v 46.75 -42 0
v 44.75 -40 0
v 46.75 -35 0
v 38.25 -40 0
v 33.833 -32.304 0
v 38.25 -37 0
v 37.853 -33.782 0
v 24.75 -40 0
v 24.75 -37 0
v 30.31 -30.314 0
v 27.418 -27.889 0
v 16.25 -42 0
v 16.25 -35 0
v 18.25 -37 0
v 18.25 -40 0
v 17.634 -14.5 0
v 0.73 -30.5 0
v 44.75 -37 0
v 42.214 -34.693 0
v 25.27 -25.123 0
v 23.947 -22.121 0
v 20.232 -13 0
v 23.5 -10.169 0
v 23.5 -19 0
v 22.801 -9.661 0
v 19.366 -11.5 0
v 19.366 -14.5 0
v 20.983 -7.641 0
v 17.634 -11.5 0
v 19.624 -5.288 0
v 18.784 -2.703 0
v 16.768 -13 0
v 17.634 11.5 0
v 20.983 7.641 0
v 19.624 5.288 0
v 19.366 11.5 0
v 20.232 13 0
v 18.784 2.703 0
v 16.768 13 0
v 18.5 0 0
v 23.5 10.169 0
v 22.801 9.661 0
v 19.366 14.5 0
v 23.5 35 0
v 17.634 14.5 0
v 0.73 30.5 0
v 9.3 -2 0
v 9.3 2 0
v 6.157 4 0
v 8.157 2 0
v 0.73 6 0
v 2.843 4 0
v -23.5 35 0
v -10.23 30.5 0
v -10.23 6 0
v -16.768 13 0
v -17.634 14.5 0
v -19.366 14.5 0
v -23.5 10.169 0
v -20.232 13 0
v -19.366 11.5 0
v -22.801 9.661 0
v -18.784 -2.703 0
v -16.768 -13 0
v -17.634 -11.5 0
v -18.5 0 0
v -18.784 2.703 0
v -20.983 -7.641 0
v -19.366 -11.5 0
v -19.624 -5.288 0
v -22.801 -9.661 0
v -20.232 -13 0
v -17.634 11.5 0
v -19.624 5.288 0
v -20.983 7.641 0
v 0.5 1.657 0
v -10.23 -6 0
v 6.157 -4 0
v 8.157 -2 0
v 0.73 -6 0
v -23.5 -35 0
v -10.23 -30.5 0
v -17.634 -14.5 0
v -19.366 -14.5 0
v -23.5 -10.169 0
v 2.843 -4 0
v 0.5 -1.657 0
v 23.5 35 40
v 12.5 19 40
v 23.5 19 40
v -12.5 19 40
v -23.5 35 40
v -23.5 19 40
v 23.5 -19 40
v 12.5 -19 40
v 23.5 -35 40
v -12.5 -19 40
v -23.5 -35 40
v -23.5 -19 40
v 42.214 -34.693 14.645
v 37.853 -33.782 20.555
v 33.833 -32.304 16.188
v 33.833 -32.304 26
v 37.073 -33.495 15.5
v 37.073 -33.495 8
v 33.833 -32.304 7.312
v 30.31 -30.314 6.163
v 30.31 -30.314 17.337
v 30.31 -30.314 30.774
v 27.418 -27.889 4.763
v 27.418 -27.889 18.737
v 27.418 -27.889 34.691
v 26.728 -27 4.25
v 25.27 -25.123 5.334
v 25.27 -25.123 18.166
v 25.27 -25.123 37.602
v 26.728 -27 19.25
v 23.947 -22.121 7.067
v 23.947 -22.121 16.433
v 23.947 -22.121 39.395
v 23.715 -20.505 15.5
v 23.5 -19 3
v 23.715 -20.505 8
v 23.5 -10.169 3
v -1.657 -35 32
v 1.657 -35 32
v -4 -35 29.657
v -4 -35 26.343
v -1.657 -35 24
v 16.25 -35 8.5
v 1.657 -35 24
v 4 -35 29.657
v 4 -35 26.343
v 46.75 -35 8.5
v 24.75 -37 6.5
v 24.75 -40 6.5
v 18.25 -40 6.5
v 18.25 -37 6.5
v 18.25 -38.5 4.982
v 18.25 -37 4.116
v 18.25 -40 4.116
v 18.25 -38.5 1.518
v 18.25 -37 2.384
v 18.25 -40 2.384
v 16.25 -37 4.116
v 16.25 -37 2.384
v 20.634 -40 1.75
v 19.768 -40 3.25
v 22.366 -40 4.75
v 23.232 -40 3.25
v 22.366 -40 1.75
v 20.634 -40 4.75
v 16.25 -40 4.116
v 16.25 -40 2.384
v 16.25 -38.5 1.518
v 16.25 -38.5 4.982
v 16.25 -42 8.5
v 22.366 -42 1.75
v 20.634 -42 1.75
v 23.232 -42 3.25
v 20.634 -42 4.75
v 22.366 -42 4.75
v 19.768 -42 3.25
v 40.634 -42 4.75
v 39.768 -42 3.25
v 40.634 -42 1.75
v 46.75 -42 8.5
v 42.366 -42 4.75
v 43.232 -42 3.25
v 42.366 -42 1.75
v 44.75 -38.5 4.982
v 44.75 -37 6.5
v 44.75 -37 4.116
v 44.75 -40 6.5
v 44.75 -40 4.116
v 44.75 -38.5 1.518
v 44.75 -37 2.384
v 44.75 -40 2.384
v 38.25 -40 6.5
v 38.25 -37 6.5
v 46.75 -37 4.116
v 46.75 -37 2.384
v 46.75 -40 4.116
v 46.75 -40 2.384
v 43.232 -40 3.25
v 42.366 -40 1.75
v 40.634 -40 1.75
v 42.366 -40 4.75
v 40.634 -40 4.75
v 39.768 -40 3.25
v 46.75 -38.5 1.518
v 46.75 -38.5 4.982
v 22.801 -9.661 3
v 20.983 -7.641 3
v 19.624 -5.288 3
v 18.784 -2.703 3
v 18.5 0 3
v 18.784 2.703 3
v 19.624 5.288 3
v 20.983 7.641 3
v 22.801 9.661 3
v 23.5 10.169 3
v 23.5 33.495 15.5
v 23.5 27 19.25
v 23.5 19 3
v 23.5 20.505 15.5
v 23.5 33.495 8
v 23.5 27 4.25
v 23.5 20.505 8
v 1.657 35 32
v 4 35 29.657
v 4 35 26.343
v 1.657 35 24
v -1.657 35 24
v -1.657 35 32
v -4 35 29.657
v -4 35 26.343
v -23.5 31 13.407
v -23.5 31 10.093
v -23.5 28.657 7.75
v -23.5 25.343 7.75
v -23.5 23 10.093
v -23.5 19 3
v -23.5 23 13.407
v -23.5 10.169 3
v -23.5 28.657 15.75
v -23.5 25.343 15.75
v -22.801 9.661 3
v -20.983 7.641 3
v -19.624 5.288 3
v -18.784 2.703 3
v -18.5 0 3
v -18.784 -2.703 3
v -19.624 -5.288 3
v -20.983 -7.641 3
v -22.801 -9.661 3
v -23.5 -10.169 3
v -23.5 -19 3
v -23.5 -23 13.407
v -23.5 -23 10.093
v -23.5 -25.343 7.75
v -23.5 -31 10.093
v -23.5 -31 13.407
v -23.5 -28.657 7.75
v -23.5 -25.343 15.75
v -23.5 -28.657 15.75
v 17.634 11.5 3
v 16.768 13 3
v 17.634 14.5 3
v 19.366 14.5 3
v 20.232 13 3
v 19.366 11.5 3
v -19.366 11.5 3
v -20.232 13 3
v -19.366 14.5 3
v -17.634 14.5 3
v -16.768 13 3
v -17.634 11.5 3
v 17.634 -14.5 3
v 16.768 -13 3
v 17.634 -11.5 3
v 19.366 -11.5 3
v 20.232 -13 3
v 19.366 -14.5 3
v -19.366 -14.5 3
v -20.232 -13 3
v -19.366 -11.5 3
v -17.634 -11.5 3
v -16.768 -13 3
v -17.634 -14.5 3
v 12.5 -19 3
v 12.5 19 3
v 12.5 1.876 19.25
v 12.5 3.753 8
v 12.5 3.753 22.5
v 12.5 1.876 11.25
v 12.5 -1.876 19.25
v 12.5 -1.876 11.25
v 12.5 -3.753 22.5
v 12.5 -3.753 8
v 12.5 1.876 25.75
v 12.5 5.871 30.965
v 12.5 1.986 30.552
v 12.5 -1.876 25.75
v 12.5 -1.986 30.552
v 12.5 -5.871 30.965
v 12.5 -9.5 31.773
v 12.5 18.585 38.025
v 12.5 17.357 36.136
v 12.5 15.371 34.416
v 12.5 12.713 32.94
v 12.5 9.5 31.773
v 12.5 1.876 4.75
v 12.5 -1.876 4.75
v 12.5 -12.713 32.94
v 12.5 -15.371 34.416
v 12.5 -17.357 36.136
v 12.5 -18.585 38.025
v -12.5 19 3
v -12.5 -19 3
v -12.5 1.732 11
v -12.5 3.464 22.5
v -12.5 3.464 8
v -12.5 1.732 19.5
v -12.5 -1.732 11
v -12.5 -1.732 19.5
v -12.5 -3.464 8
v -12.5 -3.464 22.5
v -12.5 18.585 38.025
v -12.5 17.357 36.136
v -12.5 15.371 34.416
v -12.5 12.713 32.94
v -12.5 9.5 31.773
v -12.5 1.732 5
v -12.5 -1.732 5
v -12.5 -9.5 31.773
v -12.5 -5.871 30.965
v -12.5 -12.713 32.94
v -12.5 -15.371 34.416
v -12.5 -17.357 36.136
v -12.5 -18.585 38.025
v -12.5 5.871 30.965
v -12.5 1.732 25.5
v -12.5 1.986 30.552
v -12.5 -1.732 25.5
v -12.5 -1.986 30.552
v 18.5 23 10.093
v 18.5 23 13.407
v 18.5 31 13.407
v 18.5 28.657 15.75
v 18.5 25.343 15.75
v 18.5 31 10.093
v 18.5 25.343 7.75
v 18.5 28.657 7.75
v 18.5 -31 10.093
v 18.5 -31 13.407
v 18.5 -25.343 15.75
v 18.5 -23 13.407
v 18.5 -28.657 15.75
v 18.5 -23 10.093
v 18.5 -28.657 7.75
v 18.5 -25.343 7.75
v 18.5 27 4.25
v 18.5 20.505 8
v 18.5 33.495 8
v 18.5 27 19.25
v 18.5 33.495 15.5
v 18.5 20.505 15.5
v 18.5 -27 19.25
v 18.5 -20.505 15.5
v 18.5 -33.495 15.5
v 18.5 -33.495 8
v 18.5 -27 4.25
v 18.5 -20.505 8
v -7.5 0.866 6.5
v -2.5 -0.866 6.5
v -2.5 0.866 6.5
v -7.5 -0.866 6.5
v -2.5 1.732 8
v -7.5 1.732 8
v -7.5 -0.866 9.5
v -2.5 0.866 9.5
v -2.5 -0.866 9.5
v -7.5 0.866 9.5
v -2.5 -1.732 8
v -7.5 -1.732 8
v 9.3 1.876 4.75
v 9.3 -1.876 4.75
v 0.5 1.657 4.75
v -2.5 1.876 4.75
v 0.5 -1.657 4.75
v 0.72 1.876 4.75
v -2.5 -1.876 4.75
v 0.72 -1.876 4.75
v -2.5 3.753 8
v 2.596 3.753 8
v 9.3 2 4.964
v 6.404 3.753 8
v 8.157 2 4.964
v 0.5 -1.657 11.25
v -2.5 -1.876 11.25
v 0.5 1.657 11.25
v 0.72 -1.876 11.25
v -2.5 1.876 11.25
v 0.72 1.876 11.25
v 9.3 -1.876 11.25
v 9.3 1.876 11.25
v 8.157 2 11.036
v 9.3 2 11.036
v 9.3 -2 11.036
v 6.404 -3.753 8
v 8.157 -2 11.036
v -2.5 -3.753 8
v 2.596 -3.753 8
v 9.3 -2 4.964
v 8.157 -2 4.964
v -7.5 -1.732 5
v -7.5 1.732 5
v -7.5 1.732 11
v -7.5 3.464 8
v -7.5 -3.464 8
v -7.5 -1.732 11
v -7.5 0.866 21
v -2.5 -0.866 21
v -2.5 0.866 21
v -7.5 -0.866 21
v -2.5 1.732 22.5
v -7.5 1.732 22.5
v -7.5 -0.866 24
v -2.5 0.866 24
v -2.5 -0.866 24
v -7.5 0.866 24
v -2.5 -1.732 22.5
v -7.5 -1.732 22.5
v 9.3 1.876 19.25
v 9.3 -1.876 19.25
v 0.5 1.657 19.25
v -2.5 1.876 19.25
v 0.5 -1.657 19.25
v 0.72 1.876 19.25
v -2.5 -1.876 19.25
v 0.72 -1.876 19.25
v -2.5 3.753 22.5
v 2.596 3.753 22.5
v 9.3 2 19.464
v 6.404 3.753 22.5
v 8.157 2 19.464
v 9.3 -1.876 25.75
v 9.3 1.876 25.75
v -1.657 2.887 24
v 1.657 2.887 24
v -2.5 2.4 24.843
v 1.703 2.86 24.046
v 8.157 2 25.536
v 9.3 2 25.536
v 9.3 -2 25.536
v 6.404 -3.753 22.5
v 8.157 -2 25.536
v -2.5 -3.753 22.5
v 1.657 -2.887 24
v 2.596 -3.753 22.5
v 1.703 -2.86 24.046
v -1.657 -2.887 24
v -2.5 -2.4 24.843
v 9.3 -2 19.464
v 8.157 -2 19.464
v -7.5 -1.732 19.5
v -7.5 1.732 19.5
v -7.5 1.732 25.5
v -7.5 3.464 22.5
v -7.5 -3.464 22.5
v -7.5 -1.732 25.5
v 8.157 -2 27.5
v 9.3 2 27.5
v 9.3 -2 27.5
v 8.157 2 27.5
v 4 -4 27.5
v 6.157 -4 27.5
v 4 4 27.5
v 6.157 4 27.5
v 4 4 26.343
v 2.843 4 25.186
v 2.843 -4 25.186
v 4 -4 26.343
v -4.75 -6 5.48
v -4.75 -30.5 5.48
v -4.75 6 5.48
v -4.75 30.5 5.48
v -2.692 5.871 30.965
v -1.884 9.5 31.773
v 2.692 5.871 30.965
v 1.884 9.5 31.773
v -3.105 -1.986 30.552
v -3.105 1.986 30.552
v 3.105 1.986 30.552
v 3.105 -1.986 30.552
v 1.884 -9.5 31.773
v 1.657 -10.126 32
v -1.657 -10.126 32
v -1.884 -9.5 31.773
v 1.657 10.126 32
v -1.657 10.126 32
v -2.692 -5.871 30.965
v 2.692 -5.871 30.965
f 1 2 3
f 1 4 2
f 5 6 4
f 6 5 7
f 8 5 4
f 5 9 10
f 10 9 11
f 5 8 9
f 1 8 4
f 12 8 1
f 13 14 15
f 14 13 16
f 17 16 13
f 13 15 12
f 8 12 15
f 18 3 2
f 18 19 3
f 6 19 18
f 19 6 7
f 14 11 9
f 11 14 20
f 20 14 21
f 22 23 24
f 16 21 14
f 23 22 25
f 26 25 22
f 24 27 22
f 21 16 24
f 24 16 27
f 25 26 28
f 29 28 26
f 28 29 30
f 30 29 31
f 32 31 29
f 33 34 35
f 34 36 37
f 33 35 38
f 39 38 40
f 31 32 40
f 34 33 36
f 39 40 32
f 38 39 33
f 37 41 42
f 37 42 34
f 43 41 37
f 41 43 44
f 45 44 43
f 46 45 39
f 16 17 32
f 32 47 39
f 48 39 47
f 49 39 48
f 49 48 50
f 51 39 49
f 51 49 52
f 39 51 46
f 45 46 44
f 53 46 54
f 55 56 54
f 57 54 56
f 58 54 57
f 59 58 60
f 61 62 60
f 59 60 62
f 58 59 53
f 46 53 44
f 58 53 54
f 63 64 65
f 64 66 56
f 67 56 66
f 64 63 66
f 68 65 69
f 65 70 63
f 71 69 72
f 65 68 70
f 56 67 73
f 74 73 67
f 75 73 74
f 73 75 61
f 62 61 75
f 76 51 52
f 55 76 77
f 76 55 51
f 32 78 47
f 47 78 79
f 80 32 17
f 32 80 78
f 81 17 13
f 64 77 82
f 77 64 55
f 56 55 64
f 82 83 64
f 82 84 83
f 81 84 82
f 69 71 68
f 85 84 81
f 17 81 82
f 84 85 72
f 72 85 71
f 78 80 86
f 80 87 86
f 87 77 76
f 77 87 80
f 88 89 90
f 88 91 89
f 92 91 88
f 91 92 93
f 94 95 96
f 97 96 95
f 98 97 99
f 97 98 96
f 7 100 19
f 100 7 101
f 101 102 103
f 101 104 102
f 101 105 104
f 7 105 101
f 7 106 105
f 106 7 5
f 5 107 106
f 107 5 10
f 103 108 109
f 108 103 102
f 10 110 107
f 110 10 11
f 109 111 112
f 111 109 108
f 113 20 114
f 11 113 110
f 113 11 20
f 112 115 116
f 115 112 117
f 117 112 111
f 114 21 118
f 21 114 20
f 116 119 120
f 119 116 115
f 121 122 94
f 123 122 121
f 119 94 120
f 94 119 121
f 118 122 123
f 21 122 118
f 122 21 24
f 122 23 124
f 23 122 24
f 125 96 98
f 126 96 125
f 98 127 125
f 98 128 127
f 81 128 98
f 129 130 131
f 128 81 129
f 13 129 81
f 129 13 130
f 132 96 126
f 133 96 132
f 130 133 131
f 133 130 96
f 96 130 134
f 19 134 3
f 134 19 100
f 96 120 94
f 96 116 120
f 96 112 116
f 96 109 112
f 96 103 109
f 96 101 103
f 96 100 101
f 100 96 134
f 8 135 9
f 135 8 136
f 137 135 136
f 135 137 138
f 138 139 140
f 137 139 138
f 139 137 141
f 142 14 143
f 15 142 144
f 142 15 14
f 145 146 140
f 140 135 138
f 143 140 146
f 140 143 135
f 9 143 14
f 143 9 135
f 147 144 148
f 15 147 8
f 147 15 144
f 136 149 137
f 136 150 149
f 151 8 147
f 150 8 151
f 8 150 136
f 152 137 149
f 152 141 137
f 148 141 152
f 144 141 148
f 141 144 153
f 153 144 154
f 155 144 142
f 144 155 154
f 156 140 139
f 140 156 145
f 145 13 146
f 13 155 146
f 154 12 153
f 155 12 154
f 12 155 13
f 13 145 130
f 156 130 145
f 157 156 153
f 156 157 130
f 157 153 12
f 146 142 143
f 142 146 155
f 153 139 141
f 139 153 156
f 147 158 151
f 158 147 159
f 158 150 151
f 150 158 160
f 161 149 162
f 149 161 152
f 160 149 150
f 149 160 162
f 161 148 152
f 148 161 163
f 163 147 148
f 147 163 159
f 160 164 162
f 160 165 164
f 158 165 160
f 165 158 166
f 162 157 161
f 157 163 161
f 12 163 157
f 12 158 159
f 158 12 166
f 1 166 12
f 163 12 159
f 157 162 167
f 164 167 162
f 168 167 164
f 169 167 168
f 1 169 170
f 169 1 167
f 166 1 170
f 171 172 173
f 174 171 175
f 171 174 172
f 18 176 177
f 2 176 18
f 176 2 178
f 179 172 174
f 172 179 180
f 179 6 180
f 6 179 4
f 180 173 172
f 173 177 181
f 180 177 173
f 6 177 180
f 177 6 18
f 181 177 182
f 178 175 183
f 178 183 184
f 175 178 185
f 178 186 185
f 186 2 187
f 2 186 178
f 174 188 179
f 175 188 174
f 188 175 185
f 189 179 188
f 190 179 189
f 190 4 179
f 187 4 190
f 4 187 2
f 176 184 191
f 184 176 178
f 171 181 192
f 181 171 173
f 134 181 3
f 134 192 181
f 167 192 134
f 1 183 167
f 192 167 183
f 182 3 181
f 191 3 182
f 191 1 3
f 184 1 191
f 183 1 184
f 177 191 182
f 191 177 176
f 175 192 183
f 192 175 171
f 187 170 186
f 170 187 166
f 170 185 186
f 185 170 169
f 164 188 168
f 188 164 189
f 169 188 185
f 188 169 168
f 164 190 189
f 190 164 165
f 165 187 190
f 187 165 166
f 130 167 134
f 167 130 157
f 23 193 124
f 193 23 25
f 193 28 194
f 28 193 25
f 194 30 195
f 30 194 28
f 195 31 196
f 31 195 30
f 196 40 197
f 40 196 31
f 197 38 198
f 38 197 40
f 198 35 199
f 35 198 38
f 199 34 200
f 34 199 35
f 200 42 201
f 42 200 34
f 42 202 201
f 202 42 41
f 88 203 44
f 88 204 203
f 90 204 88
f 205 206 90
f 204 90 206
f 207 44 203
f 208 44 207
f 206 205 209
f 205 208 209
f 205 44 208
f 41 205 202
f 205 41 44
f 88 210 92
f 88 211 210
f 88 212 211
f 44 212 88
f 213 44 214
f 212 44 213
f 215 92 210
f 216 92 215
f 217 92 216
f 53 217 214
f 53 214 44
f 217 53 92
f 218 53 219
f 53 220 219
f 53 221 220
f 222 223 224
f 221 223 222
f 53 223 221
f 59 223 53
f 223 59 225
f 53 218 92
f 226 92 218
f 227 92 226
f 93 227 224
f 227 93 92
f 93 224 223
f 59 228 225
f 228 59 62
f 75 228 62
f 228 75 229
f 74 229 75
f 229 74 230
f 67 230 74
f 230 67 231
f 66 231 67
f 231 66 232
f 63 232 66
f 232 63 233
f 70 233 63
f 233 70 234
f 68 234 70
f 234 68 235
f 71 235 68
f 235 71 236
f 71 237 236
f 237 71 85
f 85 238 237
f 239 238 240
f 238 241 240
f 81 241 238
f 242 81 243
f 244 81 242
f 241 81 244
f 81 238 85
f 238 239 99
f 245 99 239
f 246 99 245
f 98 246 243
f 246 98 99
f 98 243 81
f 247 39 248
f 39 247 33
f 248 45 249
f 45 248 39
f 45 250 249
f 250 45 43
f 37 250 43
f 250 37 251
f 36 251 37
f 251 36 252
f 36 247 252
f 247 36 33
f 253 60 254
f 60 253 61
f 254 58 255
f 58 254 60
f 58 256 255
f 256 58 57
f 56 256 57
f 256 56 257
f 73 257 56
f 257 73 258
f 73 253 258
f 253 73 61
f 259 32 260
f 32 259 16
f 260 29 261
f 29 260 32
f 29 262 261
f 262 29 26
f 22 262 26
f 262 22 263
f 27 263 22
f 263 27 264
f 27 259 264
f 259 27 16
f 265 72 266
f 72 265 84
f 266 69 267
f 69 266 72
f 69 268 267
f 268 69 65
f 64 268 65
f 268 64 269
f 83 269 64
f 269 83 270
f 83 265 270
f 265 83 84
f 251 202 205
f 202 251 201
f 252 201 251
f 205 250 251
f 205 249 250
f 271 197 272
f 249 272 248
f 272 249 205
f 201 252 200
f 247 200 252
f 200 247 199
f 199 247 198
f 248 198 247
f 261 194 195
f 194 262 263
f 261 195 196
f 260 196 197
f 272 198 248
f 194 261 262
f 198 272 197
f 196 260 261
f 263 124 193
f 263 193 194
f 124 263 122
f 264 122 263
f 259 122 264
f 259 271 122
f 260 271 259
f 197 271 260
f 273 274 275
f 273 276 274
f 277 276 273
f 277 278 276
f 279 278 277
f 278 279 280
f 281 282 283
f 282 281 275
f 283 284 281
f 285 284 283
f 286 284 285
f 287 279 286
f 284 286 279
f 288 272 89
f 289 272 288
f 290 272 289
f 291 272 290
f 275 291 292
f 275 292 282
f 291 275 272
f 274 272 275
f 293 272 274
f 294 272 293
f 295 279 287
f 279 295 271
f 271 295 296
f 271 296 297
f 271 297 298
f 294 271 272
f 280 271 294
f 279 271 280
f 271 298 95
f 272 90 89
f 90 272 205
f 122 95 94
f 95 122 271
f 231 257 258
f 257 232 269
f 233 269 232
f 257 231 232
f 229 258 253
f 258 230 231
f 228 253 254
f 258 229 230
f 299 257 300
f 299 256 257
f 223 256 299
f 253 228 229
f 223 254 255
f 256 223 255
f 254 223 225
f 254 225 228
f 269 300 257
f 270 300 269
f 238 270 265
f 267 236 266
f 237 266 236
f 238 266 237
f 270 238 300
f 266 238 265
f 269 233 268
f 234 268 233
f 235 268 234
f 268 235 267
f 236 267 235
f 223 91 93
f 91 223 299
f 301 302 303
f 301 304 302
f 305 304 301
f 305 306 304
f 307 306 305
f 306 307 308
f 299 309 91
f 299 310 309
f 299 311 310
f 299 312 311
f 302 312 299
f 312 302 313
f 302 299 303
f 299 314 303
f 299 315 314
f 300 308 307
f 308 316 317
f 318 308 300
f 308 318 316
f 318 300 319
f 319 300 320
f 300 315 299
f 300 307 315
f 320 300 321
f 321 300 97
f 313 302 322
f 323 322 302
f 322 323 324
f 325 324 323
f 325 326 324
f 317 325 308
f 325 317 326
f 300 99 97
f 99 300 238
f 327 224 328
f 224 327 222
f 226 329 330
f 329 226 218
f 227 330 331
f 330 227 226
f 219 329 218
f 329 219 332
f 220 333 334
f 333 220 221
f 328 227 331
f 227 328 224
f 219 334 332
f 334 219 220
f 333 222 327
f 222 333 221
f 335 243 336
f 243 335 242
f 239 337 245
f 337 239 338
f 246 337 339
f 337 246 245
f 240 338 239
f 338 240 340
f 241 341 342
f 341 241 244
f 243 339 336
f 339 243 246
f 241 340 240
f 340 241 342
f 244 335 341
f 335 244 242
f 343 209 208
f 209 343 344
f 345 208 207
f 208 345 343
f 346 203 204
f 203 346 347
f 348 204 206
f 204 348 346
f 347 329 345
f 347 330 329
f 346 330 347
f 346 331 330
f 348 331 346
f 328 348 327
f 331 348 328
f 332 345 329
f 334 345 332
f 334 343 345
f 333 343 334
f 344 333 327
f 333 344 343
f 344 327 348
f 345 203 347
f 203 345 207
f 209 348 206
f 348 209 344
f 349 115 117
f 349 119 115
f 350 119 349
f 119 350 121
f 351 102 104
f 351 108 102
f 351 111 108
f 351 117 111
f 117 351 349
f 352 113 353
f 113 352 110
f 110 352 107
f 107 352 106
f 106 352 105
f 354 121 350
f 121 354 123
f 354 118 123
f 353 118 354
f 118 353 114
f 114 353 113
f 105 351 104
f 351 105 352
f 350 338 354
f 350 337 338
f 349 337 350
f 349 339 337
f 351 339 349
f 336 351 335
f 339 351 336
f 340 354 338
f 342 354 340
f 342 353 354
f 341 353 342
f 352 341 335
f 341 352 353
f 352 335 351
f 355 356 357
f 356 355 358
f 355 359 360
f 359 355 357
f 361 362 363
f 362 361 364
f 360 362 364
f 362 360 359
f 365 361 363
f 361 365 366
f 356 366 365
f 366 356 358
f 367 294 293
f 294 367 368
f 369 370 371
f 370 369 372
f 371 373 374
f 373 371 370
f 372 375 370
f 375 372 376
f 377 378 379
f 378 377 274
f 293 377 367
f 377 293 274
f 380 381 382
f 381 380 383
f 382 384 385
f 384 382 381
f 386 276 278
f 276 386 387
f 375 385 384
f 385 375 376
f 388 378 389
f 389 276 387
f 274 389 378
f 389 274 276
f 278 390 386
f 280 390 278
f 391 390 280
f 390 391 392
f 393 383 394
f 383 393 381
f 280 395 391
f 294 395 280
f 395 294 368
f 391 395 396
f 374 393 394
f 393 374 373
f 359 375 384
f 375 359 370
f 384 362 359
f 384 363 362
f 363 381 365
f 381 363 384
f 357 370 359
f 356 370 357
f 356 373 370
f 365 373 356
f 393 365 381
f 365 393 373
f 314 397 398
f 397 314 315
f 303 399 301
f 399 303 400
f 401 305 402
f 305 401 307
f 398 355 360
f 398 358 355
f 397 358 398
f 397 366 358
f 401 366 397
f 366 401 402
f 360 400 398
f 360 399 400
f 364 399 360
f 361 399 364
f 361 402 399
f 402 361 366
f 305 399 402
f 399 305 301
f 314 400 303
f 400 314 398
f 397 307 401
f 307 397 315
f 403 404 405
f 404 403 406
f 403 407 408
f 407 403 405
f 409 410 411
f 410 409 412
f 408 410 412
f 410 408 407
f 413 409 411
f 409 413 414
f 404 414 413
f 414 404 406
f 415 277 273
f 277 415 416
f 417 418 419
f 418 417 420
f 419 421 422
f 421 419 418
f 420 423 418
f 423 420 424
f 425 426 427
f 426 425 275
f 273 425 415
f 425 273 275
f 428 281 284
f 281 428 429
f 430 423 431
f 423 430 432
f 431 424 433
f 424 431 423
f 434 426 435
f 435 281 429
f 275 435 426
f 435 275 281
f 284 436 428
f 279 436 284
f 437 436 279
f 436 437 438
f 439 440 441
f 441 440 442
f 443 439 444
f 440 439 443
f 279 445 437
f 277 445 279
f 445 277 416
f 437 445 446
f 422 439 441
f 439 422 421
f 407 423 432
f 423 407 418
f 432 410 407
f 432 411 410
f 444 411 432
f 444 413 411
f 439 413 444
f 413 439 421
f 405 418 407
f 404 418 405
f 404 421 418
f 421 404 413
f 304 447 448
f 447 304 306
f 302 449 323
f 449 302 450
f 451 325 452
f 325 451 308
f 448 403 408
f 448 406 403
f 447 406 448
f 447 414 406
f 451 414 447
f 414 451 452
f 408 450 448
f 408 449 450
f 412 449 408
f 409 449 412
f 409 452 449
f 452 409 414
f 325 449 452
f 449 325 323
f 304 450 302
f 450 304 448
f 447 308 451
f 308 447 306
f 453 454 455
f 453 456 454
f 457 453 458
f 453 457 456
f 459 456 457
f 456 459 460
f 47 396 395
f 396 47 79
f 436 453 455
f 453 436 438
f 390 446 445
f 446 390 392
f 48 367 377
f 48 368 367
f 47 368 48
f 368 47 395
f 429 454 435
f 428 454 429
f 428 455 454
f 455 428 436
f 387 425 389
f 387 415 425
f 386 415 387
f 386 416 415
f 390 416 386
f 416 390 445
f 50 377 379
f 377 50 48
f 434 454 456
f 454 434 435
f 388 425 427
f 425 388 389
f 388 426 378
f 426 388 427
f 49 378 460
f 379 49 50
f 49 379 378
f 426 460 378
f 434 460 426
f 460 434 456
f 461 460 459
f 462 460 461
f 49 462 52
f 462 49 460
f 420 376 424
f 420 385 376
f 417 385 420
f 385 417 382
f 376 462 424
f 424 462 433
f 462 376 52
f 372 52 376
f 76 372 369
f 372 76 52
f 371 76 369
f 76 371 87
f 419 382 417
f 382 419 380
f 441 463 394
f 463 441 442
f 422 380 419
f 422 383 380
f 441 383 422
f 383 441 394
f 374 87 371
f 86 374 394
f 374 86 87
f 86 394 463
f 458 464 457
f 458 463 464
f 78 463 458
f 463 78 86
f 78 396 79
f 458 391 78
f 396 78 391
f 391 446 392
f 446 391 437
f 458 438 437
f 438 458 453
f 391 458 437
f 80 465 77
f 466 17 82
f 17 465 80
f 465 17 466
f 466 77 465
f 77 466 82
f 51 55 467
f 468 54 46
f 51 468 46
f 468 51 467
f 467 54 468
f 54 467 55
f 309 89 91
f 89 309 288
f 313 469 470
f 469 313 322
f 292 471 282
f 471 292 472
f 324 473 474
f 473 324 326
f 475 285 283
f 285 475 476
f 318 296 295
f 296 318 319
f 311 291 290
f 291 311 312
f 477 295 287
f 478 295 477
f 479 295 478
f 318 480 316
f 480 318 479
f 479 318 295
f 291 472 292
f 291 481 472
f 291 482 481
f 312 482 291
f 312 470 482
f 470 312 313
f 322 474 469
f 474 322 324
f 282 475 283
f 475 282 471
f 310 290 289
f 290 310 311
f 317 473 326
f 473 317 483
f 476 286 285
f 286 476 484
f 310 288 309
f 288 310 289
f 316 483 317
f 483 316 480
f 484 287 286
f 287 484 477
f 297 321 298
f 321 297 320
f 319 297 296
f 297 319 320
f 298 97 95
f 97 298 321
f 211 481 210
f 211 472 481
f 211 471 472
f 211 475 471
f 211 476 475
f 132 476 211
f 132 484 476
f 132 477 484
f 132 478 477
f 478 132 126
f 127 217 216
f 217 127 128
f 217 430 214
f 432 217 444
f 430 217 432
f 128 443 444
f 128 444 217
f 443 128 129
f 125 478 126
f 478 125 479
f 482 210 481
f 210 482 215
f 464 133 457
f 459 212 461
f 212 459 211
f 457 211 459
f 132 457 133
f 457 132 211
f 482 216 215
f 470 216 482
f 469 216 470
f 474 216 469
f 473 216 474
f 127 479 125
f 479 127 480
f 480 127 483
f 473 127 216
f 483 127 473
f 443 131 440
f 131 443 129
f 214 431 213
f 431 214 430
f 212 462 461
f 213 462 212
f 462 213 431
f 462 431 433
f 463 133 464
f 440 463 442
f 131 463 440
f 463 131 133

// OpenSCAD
// file: settings.scad
rod_size = 8;
rod_nut_size = 15; //12 for M6, 15 for M8
bearing_size = 15.5; //12.5 for LM6UU, 15.5 for LM8UU,LM8SUU
bearing_length = 24.5; //19.5 for LM6UU, 17.5 for LM8SUU, 24.5 for LM8UU
yz_motor_distance = 25;
motor_screw_spacing = 26; //26 for NEMA14, 31 for NEMA17
motor_casing = 38; //38 for NEMA14, 45 for NEMA17
end_height = 40; //measure the height of your motor casing and add 4mm. Suggestion: 40 for NEMA14, 55 for NEMA17
bed_mount_height = 16;
//x_rod_spacing = motor_screw_spacing + 3 + rod_size;
x_rod_spacing = 30;
x_carriage_width = 70;
carriage_extruder_offset = 5;
pulley_size = 20;
idler_pulley_width = 10;
gusset_size = 15;
m3_size = 3;
m3_nut_size = 6.5;
// m3 nut height is because tristan doesn't know the height of an m3 nut, it is not implemented everywhere, just on the z stop in base_end_2off.scad
m3_nut_height = 3;
m4_size = 4;
motor_shaft_size = 5;

z_stop_screw_spacing = 20;
// these may be super unneeded, in which case we can easily do a search and replace. But they may be really useful for prototyping/whatever.
z_stop_mount_x_buffer = 2;
z_stop_mount_y_buffer = 2;
z_stop_mount_z_buffer = 2;
z_stop_side_holes = true;
z_stop_bottom_holes = false;

z_stop_arm_actuator_width = 2;
z_stop_arm_actuator_depth = 8;
z_stop_arm_actuator_height = 60;
z_stop_depth = 5;//this is for the optical endstop, this is the width from where it is mounted to where it is clear for the arm to go through.
z_stop_x_adjust=0;

// meta vars, these are set by other vars for ease of reference.
z_mount_width = m3_nut_size+z_stop_screw_spacing+(z_stop_mount_x_buffer*2);
base_z_rod_x_offset = yz_motor_distance / 2 - rod_size;
distance_between_x_end_cylinders = motor_casing / 2 + rod_size;
z_stop_x_offset = base_z_rod_x_offset + distance_between_x_end_cylinders - (z_mount_width/2) + z_stop_x_adjust;
x_end_cylinder_radius = bearing_size / 2 + 3;
x_end_front_face_y_offset = (bearing_size / 2 + 3)/2;//In case it's non obvious, this is for getting the amount the x end cylinders extend past the front face.
x_end_cylinder_protrution_depth = x_end_cylinder_radius - x_end_front_face_y_offset;
z_stop_arm_depth = z_stop_arm_actuator_depth + z_stop_depth + m3_nut_height+(z_stop_mount_y_buffer*2)+(motor_casing + (rod_size*4))/2 - x_end_front_face_y_offset;
z_stop_arm_height = z_stop_arm_actuator_height + x_rod_spacing + 8 + rod_size;
z_stop_arm_x_support_depth = (z_stop_arm_depth - x_end_cylinder_protrution_depth) / 3;

// ratio for converting diameter to apothem
da6 = 1 / cos(180 / 6) / 2;
da8 = 1 / cos(180 / 8) / 2;
// main file
include <settings.scad>;

!base_end();

module base_end(left = true) difference() {
    union() {
        linear_extrude(height = end_height, convexity = 5) difference() {
            square([yz_motor_distance + motor_casing - motor_screw_spacing + 10, motor_casing + rod_size * 4], center = true);
            for(end = [1, -1]) {
                for(side = [1, -1]) translate([end * (yz_motor_distance + motor_casing - motor_screw_spacing) / 2, side * motor_screw_spacing / 2, 0]) circle(m3_size * da6, $fn = 6);
                translate([end * (yz_motor_distance + motor_casing) / 2, 0, 0]) circle(motor_screw_spacing / 2);
            }
        }
        // z stop sensor attachment
        if (left) {
            // z stop mount support structure
            difference() {
                linear_extrude(height = end_height, convexity = 5) difference() {
                    translate ([(yz_motor_distance+motor_casing - motor_screw_spacing + 10)/2, -motor_casing/2 - rod_size * 2, 0]) {
                        square([z_mount_width - ((yz_motor_distance + motor_casing - motor_screw_spacing + 10)/2 - z_stop_x_offset), rod_size * 2]);
                    }
                    translate([(yz_motor_distance+motor_casing - motor_screw_spacing + 10)/2 + z_mount_width - ((yz_motor_distance + motor_casing - motor_screw_spacing + 10)/2 - z_stop_x_offset),-motor_casing/2,0]) resize([(z_mount_width - ((yz_motor_distance + motor_casing - motor_screw_spacing + 10)/2 - z_stop_x_offset))*2,rod_size * 4]) circle (1,$fn = 32);
                }
                translate([z_stop_x_offset + z_mount_width, -motor_casing/2 - rod_size * 2,m3_nut_size+z_stop_mount_z_buffer])
                    rotate([0,-atan2(z_mount_width - ((yz_motor_distance + motor_casing - motor_screw_spacing + 10)/2 - z_stop_x_offset), end_height-m3_nut_size-z_stop_mount_z_buffer),0])
                        cube([(z_mount_width - ((yz_motor_distance + motor_casing - motor_screw_spacing + 10)/2 - z_stop_x_offset)), rod_size * 2, sqrt(pow((z_mount_width - ((yz_motor_distance + motor_casing - motor_screw_spacing + 10)/2 - z_stop_x_offset)),2)+pow(end_height-m3_nut_size-z_stop_mount_z_buffer,2))]);
            }
            // z stop mount
            translate([z_stop_x_offset, -m3_nut_height-(z_stop_mount_y_buffer*2)-(motor_casing + (rod_size*4))/2, 0]){
                difference () {
                    cube([z_mount_width, m3_nut_height+(z_stop_mount_y_buffer*2), m3_nut_size+z_stop_mount_z_buffer]);
                    // holes for bolting
                    for(side = [0,1]) {
                        translate([(m3_nut_size+(z_stop_mount_x_buffer*2))/2+side*z_stop_screw_spacing,
                                   m3_nut_height/2+z_stop_mount_y_buffer,
                                   m3_nut_size/2]){
                            cube([m3_nut_size,m3_nut_height,m3_nut_size],center=true);
                            if (z_stop_side_holes)
                             rotate([0,90,0])
                              translate([0,0,(side-.5)*(z_stop_mount_x_buffer+m3_nut_size)])
                               cylinder(h=z_stop_mount_x_buffer,r=m3_size * da6, $fn = 6, center=true);
                            if (z_stop_bottom_holes)
                              translate([0,0,(z_stop_mount_z_buffer+m3_nut_size)/2])
                               cylinder(h=z_stop_mount_z_buffer,r=m3_size * da6, $fn = 6, center=true);
 
                            rotate([90,0,0])
                             translate([0,0,(z_stop_mount_y_buffer+m3_nut_height)/2])
                              cylinder(h=z_stop_mount_y_buffer,r=m3_size * da6, $fn = 6, center=true);
                        }
                    }
                }
            }
        }
    }
    // motor cutouts
	for(end = [1, -1]) translate([end * (yz_motor_distance + motor_casing) / 2, 0, 3]) linear_extrude(height = end_height, convexity = 5) square(motor_casing, center = true);
    // holes for x axis threaded rod for connecting to other base.
	for(side = [1, -1]) translate([0, side * (motor_casing / 2 + rod_size), rod_size / 2 + bearing_size / 2]) rotate([90, 180 / 8, 90]) {
		cylinder(r = rod_size * da8, h = yz_motor_distance + motor_casing + 20, center = true, $fn = 8);
		%translate([0, 0, -70]) cylinder(r = rod_size * da8, h = 200, center = true, $fn = 8);
	}
    
	if (left) for(side = [1, -1]) translate([0, side * (motor_casing / 2 + rod_size), rod_size / 2 + bearing_size / 2]) rotate([90, 180 / 6, 90])
		translate([0,0,(yz_motor_distance + motor_casing - motor_screw_spacing + 10)/2 - 5])
            cylinder(r = rod_nut_size / 2, h = z_mount_width+z_stop_x_offset, center = false, $fn = 6);

    // bottom arch. Mostly cosmetic.
	translate([0, 0, end_height]) scale([1, 1, .5]) rotate([90, 0, 90]) cylinder(r = motor_casing / 2, h = yz_motor_distance + 20, center = true);
    // z smooth rod hole and holes for securing z rod.
	translate([yz_motor_distance / 2 - rod_size, 0, 0]) {
		translate([0, 0, -3]) linear_extrude(height = end_height - motor_casing / 4, convexity = 5) {
			rotate(180 / 8) circle(rod_size * da8, $fn = 8);
			translate([0, -rod_size / 4, 0]) square([rod_size * .6, rod_size / 2]);
		}
		// z axis clamping
		for(h = [8, end_height - motor_casing / 4 - 8]) translate([0, 0, h]) rotate([90, 0, 90]) {
			cylinder(r = m3_size * da6, h = yz_motor_distance + motor_casing, center = true, $fn = 6);
			translate([0, 0, -rod_size / 2 - 3]) cylinder(r = m3_nut_size* da6, h = yz_motor_distance + motor_casing, $fn = 6);
			translate([0, 0, 0]) cylinder(r = m3_nut_size / 2 + 0.5, h = yz_motor_distance + motor_casing, $fn = 6);
			translate([0, 0, -rod_size / 2 - 8]) rotate([0, 180, 0]) cylinder(r = m3_size * da6 * 2, h = yz_motor_distance + motor_casing, $fn = 6);
		}
	}
    // y bearing holes
	translate([-yz_motor_distance / 2 + bearing_size / 2, 0, -bearing_size * sqrt(2) / 4]) rotate([90, -45, 0]) {
		%cylinder(r = rod_size * da8, h = 100, center = true, $fn = 8);
		for(side = [0, 1]) mirror([0, 0, side]) translate([0, 0, rod_size / 2 + 2]) {
			cylinder(r = bearing_size / 2, h = bearing_length, center = false, $fn = 80);
			cube([bearing_size / 2, bearing_size / 2, bearing_length]);
		}
	}
    // y support rod hole
	translate([0, 0, end_height - rod_size * 1.5]) rotate([90, 180 / 8, 0]) cylinder(r = rod_size * da8, h = motor_casing + rod_size * 5, $fn = 8, center = true);
	%translate([0, 0, end_height - rod_size * 1.5]) rotate([90, 180 / 8, 0]) cylinder(r = rod_size * da8, h = 100, $fn = 8, center = true);
}
